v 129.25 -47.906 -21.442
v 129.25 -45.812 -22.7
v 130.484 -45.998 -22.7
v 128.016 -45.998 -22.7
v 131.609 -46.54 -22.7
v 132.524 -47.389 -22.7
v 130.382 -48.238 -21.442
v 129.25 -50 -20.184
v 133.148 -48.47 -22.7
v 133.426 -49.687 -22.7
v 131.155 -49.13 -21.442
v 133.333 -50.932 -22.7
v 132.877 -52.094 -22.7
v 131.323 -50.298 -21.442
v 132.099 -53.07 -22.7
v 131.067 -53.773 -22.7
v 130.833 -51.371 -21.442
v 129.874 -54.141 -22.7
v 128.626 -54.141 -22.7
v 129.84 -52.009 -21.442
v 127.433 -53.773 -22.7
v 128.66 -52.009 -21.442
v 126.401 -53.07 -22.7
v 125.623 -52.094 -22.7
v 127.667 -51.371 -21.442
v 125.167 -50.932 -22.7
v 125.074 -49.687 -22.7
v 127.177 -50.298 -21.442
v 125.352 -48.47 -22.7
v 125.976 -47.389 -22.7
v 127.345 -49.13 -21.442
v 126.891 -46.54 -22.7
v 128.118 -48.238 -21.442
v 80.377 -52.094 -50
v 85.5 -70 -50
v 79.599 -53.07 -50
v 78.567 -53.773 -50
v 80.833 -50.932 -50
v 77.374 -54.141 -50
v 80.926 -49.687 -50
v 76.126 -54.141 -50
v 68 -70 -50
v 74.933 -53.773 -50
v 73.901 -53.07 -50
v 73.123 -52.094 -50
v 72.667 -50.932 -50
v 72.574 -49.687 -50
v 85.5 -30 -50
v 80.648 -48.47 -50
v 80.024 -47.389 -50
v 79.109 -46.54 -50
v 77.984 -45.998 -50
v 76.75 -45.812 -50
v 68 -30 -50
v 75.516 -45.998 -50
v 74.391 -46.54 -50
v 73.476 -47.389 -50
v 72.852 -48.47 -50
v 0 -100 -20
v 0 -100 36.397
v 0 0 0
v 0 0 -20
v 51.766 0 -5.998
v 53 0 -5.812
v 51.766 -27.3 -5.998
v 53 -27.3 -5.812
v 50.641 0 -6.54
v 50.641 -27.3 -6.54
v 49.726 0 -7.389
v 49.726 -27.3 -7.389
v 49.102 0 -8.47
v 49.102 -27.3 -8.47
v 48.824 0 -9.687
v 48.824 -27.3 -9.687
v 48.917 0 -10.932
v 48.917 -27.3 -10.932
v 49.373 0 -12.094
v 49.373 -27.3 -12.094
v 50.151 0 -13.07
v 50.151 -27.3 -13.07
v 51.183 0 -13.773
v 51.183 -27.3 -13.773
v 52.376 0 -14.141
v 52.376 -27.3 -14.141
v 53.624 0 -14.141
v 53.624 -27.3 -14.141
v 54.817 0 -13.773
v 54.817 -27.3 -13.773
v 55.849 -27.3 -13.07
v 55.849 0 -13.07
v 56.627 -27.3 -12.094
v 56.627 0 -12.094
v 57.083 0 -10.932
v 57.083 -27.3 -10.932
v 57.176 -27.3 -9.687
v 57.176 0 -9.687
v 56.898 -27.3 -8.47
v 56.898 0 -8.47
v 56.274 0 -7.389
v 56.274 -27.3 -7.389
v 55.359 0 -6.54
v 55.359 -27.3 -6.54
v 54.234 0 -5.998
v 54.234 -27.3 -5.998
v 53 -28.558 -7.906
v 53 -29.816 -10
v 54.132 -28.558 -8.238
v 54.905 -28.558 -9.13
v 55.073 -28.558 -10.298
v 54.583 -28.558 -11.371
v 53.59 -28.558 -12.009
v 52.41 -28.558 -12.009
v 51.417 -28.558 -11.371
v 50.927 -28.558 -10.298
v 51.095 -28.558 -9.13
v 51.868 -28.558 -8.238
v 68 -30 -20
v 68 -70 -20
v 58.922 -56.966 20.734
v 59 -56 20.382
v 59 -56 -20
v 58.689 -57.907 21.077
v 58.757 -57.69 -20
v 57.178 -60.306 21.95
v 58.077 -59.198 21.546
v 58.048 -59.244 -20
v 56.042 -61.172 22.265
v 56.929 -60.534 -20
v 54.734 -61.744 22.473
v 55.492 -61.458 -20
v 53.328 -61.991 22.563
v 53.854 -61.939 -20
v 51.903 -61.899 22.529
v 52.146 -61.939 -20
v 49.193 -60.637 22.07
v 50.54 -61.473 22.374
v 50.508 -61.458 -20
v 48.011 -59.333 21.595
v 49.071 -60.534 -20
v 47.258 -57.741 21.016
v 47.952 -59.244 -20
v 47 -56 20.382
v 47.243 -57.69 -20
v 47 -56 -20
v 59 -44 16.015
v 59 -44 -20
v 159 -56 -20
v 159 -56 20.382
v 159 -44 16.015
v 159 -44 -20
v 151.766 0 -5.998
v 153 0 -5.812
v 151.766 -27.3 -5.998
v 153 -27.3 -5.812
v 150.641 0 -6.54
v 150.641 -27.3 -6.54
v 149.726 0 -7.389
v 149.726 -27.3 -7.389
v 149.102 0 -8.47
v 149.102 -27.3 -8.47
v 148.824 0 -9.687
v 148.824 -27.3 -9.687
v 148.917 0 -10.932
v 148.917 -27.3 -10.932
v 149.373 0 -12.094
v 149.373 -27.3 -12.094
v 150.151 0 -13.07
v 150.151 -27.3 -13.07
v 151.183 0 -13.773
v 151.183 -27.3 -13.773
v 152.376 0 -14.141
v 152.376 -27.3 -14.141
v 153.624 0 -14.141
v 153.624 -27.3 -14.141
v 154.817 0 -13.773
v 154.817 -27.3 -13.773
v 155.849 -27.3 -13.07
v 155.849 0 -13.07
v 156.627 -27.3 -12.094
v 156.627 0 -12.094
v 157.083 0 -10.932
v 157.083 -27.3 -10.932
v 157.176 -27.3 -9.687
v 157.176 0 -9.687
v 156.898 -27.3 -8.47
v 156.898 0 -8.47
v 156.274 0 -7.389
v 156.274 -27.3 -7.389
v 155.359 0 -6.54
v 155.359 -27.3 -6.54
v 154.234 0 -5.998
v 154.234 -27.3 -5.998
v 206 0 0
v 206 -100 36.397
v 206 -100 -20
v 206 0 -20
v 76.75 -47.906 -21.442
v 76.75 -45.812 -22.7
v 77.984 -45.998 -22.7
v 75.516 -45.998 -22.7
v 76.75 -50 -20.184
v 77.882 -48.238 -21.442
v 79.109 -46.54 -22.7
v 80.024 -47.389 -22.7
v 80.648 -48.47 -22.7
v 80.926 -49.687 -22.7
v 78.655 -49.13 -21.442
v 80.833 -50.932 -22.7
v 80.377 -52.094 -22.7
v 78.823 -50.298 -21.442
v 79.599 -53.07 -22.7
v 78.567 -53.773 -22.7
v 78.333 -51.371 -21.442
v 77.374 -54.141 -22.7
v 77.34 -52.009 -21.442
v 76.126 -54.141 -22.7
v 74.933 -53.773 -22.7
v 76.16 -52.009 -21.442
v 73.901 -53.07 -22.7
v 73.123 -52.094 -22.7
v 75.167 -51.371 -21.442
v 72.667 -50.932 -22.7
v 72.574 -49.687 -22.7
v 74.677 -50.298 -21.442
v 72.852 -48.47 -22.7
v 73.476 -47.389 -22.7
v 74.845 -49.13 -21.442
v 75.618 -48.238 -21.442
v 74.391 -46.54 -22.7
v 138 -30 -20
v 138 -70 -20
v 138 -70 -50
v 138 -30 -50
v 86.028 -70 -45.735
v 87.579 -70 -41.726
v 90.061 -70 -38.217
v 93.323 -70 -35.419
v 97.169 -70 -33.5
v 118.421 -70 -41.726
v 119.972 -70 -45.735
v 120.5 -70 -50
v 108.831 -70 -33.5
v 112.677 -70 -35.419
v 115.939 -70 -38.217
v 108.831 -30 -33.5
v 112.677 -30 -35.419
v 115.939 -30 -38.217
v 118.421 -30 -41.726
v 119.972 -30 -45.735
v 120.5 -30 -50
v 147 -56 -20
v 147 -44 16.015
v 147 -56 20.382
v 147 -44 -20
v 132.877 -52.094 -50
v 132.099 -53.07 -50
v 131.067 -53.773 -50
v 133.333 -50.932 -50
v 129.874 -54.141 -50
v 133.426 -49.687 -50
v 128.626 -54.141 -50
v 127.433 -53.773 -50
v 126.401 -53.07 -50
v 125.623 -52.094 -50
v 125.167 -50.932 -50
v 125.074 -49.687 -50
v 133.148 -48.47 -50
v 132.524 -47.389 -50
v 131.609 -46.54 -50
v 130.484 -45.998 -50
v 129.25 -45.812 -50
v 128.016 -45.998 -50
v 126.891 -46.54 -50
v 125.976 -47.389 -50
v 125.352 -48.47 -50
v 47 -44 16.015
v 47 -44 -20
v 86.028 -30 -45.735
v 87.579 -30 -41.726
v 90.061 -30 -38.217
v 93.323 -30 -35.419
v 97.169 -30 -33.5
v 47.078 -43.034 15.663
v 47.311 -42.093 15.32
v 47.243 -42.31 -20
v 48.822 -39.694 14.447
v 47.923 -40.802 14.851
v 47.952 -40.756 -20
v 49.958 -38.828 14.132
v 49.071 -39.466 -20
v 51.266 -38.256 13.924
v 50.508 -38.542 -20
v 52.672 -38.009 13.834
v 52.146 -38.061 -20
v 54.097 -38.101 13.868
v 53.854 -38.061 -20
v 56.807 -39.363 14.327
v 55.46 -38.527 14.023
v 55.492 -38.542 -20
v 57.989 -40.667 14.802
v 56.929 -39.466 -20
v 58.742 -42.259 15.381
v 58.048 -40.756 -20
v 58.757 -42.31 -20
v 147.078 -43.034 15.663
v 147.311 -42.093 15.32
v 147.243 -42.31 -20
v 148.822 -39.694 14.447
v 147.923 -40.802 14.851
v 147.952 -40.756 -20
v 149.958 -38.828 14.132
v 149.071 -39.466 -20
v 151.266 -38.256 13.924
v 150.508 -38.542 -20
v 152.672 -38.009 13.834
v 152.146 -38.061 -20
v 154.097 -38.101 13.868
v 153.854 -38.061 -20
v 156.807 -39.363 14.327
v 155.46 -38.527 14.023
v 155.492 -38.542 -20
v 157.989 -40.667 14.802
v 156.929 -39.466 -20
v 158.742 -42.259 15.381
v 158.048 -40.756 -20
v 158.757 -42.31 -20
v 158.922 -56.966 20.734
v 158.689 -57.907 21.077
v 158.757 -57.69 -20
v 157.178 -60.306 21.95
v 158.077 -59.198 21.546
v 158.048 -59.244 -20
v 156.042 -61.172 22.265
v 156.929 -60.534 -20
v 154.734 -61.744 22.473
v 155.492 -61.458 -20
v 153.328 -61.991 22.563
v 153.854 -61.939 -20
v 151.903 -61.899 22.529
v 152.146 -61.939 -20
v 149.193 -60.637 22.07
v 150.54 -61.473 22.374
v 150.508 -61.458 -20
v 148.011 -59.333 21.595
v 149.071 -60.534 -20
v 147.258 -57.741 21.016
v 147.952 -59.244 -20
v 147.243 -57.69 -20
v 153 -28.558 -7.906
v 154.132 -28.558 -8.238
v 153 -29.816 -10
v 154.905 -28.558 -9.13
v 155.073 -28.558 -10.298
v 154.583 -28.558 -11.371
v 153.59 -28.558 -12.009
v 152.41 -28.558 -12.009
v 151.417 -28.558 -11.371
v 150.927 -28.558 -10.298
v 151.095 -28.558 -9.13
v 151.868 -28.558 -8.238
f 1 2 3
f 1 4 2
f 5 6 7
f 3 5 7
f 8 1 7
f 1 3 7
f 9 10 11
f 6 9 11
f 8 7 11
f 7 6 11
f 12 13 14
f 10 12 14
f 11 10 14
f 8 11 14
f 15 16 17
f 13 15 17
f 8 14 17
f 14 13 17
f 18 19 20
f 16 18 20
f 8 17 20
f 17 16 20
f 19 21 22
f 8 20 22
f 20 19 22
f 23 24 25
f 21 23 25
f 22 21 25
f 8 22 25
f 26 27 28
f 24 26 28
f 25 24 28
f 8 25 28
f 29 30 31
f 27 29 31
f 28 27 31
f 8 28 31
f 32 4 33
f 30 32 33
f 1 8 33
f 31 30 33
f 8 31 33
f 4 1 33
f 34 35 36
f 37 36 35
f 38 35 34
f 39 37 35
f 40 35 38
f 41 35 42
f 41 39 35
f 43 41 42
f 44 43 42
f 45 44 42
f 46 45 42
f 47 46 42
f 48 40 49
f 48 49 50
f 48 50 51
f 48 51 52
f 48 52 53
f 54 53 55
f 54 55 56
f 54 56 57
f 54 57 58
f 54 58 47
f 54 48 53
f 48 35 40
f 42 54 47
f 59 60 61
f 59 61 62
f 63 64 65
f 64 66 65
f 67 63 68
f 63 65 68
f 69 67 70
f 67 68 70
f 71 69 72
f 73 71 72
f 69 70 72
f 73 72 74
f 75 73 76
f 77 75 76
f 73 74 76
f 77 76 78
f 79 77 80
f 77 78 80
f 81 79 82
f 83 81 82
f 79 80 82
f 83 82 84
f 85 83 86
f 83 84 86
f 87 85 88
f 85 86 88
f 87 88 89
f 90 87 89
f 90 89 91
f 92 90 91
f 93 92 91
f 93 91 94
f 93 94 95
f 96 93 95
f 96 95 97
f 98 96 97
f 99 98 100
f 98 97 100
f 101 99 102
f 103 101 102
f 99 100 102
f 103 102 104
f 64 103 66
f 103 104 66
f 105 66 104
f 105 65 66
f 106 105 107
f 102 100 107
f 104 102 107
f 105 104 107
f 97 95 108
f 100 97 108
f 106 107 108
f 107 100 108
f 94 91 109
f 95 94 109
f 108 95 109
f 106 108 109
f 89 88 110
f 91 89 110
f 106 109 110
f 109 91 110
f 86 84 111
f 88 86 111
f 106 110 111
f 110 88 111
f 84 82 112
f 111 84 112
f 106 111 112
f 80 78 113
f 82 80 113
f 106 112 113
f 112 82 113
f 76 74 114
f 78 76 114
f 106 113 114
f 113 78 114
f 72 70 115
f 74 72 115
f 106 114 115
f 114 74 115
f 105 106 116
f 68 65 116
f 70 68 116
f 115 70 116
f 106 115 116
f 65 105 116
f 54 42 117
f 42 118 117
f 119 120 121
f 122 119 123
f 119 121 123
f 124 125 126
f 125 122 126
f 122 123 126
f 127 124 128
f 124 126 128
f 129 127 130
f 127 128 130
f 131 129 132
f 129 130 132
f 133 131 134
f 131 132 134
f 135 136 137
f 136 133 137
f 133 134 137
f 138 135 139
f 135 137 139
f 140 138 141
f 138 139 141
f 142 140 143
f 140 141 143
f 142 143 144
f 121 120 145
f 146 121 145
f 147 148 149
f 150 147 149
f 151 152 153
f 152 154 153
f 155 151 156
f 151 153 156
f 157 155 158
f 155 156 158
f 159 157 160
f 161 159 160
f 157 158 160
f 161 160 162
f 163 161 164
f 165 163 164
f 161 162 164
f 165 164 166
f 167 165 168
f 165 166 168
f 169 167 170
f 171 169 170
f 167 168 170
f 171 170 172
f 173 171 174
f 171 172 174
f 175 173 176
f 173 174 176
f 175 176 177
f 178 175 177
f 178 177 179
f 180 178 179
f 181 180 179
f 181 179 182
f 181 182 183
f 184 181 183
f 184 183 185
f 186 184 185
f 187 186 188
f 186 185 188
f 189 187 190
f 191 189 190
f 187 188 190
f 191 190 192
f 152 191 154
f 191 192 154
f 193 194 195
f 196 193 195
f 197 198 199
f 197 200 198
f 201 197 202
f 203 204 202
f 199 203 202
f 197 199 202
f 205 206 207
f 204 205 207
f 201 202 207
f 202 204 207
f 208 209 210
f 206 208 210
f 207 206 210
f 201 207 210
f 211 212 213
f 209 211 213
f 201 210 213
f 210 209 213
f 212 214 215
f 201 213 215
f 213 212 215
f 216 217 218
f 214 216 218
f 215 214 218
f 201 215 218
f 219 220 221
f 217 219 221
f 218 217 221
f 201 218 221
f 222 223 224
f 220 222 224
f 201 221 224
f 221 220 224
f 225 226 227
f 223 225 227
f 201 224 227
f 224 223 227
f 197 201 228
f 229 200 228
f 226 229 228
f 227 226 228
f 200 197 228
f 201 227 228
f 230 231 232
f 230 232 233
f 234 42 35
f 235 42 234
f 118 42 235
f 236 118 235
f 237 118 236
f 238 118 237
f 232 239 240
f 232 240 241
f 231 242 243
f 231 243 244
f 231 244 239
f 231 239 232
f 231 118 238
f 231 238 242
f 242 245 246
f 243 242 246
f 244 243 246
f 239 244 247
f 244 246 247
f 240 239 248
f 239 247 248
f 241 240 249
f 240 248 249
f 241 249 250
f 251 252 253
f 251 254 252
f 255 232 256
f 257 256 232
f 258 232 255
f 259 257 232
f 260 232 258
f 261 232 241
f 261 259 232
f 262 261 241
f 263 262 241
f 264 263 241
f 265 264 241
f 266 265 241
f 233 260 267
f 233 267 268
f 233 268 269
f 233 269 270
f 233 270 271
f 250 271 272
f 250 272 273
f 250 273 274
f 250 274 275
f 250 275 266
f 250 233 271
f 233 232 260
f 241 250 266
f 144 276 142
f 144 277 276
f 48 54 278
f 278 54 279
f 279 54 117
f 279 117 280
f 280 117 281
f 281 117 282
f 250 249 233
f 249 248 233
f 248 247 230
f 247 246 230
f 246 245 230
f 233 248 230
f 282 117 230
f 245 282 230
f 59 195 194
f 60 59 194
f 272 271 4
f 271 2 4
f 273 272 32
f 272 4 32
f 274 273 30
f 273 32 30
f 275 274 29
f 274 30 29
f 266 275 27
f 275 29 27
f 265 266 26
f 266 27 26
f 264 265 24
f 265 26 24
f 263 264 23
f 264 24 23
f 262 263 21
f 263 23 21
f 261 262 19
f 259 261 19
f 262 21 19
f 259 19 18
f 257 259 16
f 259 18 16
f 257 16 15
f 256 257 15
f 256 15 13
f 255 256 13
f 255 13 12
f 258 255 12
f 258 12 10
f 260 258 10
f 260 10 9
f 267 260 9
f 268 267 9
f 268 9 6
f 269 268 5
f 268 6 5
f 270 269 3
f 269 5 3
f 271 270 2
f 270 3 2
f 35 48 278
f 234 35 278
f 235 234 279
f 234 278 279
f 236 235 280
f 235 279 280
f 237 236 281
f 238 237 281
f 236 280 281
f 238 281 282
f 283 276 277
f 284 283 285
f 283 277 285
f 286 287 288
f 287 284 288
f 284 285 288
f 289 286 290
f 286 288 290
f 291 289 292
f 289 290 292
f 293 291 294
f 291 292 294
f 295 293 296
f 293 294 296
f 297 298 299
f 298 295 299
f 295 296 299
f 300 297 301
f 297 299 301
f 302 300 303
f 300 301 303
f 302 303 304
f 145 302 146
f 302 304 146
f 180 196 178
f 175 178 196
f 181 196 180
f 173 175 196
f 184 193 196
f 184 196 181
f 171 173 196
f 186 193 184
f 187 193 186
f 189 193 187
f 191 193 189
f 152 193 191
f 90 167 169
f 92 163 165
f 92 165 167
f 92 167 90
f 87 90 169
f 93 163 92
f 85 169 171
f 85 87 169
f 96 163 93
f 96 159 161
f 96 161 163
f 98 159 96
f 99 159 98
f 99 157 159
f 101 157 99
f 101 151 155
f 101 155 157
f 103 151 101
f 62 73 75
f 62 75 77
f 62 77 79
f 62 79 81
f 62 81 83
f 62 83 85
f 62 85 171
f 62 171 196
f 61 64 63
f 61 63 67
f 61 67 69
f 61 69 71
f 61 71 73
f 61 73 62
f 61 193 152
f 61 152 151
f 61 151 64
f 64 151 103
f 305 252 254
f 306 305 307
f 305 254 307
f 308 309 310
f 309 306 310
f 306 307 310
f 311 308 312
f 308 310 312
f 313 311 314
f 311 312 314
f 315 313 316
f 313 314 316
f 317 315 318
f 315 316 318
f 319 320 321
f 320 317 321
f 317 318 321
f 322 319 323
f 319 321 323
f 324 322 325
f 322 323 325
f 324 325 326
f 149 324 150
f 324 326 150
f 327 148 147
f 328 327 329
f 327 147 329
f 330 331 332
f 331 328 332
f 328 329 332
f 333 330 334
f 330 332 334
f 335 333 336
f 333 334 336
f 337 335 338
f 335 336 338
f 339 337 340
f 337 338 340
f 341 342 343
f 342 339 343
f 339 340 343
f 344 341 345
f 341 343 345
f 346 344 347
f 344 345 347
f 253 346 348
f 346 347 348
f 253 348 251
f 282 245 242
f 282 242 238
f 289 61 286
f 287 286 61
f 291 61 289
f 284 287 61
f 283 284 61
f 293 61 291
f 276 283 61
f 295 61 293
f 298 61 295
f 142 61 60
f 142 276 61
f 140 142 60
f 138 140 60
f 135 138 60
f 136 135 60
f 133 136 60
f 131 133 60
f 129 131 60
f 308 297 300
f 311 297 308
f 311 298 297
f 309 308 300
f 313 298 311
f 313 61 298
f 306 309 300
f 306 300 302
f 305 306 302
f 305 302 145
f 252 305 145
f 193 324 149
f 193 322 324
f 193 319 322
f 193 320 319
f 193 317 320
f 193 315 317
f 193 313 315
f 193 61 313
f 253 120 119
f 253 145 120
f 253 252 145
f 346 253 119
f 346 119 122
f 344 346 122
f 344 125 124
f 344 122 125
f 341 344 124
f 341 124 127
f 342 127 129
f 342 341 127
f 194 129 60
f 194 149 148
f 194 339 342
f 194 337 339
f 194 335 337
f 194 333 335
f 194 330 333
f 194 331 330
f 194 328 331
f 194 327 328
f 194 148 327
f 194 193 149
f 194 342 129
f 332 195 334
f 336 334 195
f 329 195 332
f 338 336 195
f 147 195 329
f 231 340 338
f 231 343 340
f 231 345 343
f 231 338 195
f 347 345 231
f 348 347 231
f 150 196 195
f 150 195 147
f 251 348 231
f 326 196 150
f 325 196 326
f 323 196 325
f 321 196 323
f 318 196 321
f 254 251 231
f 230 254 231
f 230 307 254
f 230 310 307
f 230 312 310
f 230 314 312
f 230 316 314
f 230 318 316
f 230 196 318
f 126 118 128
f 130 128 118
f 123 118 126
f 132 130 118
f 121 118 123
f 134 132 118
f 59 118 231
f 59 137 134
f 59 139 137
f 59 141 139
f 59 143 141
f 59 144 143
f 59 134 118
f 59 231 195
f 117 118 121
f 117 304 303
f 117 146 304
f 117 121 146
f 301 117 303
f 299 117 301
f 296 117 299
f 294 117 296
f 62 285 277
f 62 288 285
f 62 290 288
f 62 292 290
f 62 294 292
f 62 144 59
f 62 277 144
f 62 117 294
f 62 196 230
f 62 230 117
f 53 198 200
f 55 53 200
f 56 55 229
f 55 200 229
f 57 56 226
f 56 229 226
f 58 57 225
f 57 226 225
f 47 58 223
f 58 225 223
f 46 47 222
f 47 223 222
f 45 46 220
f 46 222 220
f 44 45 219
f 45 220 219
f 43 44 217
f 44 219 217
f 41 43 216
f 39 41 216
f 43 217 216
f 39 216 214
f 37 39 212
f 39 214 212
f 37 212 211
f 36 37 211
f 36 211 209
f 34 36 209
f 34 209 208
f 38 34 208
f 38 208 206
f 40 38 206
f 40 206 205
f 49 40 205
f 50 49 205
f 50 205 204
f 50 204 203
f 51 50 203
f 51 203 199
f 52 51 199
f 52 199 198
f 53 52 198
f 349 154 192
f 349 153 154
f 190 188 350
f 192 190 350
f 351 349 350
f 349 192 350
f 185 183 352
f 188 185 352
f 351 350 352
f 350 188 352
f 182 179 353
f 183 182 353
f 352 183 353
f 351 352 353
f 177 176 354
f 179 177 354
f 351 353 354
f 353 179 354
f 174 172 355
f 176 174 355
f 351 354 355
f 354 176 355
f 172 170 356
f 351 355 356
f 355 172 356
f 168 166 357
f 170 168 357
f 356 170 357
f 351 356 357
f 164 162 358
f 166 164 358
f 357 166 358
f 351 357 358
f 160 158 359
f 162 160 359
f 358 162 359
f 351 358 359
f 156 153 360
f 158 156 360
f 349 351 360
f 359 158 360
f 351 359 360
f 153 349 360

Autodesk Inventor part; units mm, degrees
ref_plane "YZ Plane" through (0, 0, 0) normal (1, 0, 0) x (0, 1, 0)
ref_plane "XZ Plane" through (0, 0, 0) normal (0, 1, 0) x (-1, 0, 0)
ref_plane "XY Plane" through (0, 0, 0) normal (0, 0, 1) x (1, 0, 0)
sketch "Skizze1" plane through (0, 0, 0) normal (0, 1, 0) x (-1, 0, 0)
  line L0 (0, 0) -> (-206, 0)
  line L1 (-206, 0) -> (-206, -20)
  line L2 (-206, -20) -> (0, -20)
  line L3 (0, -20) -> (0, 0)
  dimension "d0" = 206
  dimension "d1" = 20
extrude "Extrusion1" add sketch "Skizze1" against normal blind 100
sketch "Skizze2" plane through (0, 0, 0) normal (0, 1, 0) x (1, 0, 0)
  line L0 (0, 0) -> (0, 10) construction
  line L1 (0, 10) -> (206, 10) construction
  line L2 (0, 10) -> (103, 10) construction
  line L3 (103, 10) -> (53, 10) construction
  line L4 (53, 10) -> (153, 10) construction
  dimension "d4" = 10
  dimension "d5" = 206
  dimension "d6" = 90
  dimension "d7" = 103
  dimension "d8" = 50
  dimension "d9" = 100
hole "Bohrung1" at (153, 0, -10) at (53, 0, -10) direction (0, -1, 0) diameter 8.376 depth 27.3 tip angle 118 thread size "M10x1.5" class "6H" standard "ISO Metric profile"
sketch "Skizze3" plane through (206, 0, 0) normal (1, 0, 0) x (0, 0, -1)
  line L0 (0, 0) -> (-41.0424, -112.7631)
  line L1 (0, 0) -> (120, 0) construction
  line L2 (0, 0) -> (0, -100) projected
  line L3 (0, -100) -> (-50, -100)
  line L4 (0, -100) -> (50, -100) construction
  point P0 (-36.397, -100)
  dimension "d17" = 120
  dimension "d18" = 110
  dimension "d19" = 50
  dimension "d20" = 180
extrude "Extrusion2" add sketch "Skizze3" against normal blind 206
sketch "Skizze4" plane through (206, 0, -20) normal (0, 0, -1) x (-1, 0, 0)
  line L0 (206, 0) -> (103, 0) construction
  line L1 (206, 0) -> (309, 0) construction
  line L2 (103, 0) -> (153, 0) construction
  line L3 (0, 0) -> (206, 0) construction
  line L4 (153, 0) -> (53, 0) construction
  line L5 (53, 0) -> (53, -50) construction
  line L6 (53, 0) -> (103, 0) construction
  line L7 (153, 0) -> (153, -50) construction
  line L8 (153, 0) -> (203, 0) construction
  line L9 (53, -50) -> (59, -50)
  line L10 (59, -50) -> (59, -44)
  arc A0 (59, -44) -> (47, -44) centre (53, -44) ccw
  line L11 (53, -44) -> (47, -44) construction
  line L12 (53, -44) -> (59, -44) construction
  line L13 (47, -44) -> (47, -50)
  line L14 (47, -50) -> (59, -50) construction
  line L15 (53, -100) -> (53, -50) construction
  line L16 (59, -50) -> (59, -56)
  arc A1 (47, -56) -> (59, -56) centre (53, -56) ccw
  line L17 (53, -56) -> (47, -56) construction
  line L18 (53, -56) -> (59, -56) construction
  line L19 (47, -56) -> (47, -50)
  line L20 (103, 0) -> (103, -100) construction
  line L21 (103, 0) -> (203, 0) construction
  line L22 (153, -50) -> (147, -50)
  line L23 (147, -50) -> (147, -44)
  arc A2 (159, -44) -> (147, -44) centre (153, -44) ccw
  line L24 (153, -44) -> (159, -44) construction
  line L25 (153, -44) -> (147, -44) construction
  line L26 (159, -44) -> (159, -50)
  line L27 (159, -50) -> (147, -50) construction
  line L28 (147, -50) -> (147, -56)
  line L29 (153, -56) -> (147, -56) construction
  line L30 (153, -56) -> (159, -56) construction
  line L31 (159, -56) -> (159, -50)
  arc A3 (147, -56) -> (159, -56) centre (153, -56) ccw
  dimension "d23" = 103
  dimension "d24" = 180
  dimension "d25" = 50
  dimension "d26" = 100
  dimension "d27" = 0
  dimension "d28" = 50
  dimension "d29" = 90
  dimension "d30" = 50
  dimension "d31" = 90
  dimension "d32" = 6
  dimension "d33" = 6
  dimension "d34" = 180
  dimension "d35" = 100
  dimension "d36" = 90
extrude "Extrusion3" cut sketch "Skizze4" against normal blind 100
sketch "Skizze5" plane through (206, 0, -20) normal (0, 0, -1) x (-1, 0, 0)
  line L0 (206, 0) -> (0, 0) projected
  line L1 (103, 0) -> (103, -100)
  line L2 (206, -100) -> (0, -100) projected
  line L3 (0, 0) -> (0, -100) projected
  line L4 (0, -50) -> (206, -50)
  line L5 (206, 0) -> (206, -100) projected
  line L6 (103, -50) -> (68, -50)
  line L7 (68, -50) -> (68, -30)
  line L8 (68, -30) -> (103, -30)
  line L9 (103, -30) -> (103, -50)
  line L10 (103, -50) -> (138, -50)
  line L11 (138, -50) -> (138, -30)
  line L12 (138, -30) -> (103, -30)
  line L13 (68, -50) -> (68, -70)
  line L14 (68, -70) -> (103, -70)
  line L15 (103, -70) -> (103, -50)
  line L16 (138, -50) -> (138, -70)
  line L17 (138, -70) -> (103, -70)
  dimension "d39" = 35
  dimension "d40" = 20
extrude "Extrusion4" add sketch "Skizze5" along normal blind 30 contours L12 L11 L4 L1 | L1 L4 L7 L8 | L16 L17 L1 L4 | L1 L14 L13 L4
sketch "Skizze6" plane through (68, -30, -20) normal (0, 1, 0) x (1, 0, 0)
  line L0 (70, 30) -> (0, 30) projected
  circle A0 centre (35, 30) radius 17.5
  point P0 (-68, -20)
  dimension "d43" = 35
extrude "Extrusion5" cut sketch "Skizze6" against normal blind 40
sketch "Skizze7" plane through (68, -30, -20) normal (0, 1, 0) x (1, 0, 0)
  arc A0 (17.5, 30) -> (52.5, 30) centre (35, 30) ccw projected
  line L0 (35, 12.5) -> (35, 13.5)
  line L1 (35, 12.5) -> (36, 12.5) construction
  line L2 (35, 13.5) -> (45, 13.5)
  line L3 (45, 13.5) -> (25, 13.5)
  point P0 (-68, -20)
  point P1 (35, 13.5)
  point P2 (29.169, 13.5)
  point P3 (40.831, 13.5)
  dimension "d46" = 1
  dimension "d47" = 90
  dimension "d48" = 10
  dimension "d49" = 90
  dimension "d50" = 20
  dimension "d51" = 0
extrude "Extrusion6" add sketch "Skizze7" against normal blind 40
sketch "Skizze8" plane through (206, 0, -50) normal (0, 0, -1) x (-1, 0, 0)
  line L0 (68, -30) -> (138, -30) construction
  line L1 (85.5, -70) -> (85.5, -30) construction
  line L2 (68, -30) -> (85.5, -70) construction
  line L3 (138, -70) -> (68, -70) construction
  line L4 (68, -70) -> (85.5, -30) construction
  line L5 (103, -30) -> (103, -70) construction
  line L6 (120.5, -70) -> (120.5, -30) construction
  line L7 (138, -30) -> (120.5, -70) construction
  line L8 (138, -70) -> (120.5, -30) construction
  point P0 (206, 0)
  point P1 (76.75, -50)
  point P2 (129.25, -50)
hole "Bohrung2" at (129.25, -50, -50) at (76.75, -50, -50) direction (0, 0, 1) diameter 8.376 depth 27.3 tip angle 118 thread size "M10x1.5" class "6H" standard "ISO Metric profile"
properties part number "Motorhalterung_BT2.1"
